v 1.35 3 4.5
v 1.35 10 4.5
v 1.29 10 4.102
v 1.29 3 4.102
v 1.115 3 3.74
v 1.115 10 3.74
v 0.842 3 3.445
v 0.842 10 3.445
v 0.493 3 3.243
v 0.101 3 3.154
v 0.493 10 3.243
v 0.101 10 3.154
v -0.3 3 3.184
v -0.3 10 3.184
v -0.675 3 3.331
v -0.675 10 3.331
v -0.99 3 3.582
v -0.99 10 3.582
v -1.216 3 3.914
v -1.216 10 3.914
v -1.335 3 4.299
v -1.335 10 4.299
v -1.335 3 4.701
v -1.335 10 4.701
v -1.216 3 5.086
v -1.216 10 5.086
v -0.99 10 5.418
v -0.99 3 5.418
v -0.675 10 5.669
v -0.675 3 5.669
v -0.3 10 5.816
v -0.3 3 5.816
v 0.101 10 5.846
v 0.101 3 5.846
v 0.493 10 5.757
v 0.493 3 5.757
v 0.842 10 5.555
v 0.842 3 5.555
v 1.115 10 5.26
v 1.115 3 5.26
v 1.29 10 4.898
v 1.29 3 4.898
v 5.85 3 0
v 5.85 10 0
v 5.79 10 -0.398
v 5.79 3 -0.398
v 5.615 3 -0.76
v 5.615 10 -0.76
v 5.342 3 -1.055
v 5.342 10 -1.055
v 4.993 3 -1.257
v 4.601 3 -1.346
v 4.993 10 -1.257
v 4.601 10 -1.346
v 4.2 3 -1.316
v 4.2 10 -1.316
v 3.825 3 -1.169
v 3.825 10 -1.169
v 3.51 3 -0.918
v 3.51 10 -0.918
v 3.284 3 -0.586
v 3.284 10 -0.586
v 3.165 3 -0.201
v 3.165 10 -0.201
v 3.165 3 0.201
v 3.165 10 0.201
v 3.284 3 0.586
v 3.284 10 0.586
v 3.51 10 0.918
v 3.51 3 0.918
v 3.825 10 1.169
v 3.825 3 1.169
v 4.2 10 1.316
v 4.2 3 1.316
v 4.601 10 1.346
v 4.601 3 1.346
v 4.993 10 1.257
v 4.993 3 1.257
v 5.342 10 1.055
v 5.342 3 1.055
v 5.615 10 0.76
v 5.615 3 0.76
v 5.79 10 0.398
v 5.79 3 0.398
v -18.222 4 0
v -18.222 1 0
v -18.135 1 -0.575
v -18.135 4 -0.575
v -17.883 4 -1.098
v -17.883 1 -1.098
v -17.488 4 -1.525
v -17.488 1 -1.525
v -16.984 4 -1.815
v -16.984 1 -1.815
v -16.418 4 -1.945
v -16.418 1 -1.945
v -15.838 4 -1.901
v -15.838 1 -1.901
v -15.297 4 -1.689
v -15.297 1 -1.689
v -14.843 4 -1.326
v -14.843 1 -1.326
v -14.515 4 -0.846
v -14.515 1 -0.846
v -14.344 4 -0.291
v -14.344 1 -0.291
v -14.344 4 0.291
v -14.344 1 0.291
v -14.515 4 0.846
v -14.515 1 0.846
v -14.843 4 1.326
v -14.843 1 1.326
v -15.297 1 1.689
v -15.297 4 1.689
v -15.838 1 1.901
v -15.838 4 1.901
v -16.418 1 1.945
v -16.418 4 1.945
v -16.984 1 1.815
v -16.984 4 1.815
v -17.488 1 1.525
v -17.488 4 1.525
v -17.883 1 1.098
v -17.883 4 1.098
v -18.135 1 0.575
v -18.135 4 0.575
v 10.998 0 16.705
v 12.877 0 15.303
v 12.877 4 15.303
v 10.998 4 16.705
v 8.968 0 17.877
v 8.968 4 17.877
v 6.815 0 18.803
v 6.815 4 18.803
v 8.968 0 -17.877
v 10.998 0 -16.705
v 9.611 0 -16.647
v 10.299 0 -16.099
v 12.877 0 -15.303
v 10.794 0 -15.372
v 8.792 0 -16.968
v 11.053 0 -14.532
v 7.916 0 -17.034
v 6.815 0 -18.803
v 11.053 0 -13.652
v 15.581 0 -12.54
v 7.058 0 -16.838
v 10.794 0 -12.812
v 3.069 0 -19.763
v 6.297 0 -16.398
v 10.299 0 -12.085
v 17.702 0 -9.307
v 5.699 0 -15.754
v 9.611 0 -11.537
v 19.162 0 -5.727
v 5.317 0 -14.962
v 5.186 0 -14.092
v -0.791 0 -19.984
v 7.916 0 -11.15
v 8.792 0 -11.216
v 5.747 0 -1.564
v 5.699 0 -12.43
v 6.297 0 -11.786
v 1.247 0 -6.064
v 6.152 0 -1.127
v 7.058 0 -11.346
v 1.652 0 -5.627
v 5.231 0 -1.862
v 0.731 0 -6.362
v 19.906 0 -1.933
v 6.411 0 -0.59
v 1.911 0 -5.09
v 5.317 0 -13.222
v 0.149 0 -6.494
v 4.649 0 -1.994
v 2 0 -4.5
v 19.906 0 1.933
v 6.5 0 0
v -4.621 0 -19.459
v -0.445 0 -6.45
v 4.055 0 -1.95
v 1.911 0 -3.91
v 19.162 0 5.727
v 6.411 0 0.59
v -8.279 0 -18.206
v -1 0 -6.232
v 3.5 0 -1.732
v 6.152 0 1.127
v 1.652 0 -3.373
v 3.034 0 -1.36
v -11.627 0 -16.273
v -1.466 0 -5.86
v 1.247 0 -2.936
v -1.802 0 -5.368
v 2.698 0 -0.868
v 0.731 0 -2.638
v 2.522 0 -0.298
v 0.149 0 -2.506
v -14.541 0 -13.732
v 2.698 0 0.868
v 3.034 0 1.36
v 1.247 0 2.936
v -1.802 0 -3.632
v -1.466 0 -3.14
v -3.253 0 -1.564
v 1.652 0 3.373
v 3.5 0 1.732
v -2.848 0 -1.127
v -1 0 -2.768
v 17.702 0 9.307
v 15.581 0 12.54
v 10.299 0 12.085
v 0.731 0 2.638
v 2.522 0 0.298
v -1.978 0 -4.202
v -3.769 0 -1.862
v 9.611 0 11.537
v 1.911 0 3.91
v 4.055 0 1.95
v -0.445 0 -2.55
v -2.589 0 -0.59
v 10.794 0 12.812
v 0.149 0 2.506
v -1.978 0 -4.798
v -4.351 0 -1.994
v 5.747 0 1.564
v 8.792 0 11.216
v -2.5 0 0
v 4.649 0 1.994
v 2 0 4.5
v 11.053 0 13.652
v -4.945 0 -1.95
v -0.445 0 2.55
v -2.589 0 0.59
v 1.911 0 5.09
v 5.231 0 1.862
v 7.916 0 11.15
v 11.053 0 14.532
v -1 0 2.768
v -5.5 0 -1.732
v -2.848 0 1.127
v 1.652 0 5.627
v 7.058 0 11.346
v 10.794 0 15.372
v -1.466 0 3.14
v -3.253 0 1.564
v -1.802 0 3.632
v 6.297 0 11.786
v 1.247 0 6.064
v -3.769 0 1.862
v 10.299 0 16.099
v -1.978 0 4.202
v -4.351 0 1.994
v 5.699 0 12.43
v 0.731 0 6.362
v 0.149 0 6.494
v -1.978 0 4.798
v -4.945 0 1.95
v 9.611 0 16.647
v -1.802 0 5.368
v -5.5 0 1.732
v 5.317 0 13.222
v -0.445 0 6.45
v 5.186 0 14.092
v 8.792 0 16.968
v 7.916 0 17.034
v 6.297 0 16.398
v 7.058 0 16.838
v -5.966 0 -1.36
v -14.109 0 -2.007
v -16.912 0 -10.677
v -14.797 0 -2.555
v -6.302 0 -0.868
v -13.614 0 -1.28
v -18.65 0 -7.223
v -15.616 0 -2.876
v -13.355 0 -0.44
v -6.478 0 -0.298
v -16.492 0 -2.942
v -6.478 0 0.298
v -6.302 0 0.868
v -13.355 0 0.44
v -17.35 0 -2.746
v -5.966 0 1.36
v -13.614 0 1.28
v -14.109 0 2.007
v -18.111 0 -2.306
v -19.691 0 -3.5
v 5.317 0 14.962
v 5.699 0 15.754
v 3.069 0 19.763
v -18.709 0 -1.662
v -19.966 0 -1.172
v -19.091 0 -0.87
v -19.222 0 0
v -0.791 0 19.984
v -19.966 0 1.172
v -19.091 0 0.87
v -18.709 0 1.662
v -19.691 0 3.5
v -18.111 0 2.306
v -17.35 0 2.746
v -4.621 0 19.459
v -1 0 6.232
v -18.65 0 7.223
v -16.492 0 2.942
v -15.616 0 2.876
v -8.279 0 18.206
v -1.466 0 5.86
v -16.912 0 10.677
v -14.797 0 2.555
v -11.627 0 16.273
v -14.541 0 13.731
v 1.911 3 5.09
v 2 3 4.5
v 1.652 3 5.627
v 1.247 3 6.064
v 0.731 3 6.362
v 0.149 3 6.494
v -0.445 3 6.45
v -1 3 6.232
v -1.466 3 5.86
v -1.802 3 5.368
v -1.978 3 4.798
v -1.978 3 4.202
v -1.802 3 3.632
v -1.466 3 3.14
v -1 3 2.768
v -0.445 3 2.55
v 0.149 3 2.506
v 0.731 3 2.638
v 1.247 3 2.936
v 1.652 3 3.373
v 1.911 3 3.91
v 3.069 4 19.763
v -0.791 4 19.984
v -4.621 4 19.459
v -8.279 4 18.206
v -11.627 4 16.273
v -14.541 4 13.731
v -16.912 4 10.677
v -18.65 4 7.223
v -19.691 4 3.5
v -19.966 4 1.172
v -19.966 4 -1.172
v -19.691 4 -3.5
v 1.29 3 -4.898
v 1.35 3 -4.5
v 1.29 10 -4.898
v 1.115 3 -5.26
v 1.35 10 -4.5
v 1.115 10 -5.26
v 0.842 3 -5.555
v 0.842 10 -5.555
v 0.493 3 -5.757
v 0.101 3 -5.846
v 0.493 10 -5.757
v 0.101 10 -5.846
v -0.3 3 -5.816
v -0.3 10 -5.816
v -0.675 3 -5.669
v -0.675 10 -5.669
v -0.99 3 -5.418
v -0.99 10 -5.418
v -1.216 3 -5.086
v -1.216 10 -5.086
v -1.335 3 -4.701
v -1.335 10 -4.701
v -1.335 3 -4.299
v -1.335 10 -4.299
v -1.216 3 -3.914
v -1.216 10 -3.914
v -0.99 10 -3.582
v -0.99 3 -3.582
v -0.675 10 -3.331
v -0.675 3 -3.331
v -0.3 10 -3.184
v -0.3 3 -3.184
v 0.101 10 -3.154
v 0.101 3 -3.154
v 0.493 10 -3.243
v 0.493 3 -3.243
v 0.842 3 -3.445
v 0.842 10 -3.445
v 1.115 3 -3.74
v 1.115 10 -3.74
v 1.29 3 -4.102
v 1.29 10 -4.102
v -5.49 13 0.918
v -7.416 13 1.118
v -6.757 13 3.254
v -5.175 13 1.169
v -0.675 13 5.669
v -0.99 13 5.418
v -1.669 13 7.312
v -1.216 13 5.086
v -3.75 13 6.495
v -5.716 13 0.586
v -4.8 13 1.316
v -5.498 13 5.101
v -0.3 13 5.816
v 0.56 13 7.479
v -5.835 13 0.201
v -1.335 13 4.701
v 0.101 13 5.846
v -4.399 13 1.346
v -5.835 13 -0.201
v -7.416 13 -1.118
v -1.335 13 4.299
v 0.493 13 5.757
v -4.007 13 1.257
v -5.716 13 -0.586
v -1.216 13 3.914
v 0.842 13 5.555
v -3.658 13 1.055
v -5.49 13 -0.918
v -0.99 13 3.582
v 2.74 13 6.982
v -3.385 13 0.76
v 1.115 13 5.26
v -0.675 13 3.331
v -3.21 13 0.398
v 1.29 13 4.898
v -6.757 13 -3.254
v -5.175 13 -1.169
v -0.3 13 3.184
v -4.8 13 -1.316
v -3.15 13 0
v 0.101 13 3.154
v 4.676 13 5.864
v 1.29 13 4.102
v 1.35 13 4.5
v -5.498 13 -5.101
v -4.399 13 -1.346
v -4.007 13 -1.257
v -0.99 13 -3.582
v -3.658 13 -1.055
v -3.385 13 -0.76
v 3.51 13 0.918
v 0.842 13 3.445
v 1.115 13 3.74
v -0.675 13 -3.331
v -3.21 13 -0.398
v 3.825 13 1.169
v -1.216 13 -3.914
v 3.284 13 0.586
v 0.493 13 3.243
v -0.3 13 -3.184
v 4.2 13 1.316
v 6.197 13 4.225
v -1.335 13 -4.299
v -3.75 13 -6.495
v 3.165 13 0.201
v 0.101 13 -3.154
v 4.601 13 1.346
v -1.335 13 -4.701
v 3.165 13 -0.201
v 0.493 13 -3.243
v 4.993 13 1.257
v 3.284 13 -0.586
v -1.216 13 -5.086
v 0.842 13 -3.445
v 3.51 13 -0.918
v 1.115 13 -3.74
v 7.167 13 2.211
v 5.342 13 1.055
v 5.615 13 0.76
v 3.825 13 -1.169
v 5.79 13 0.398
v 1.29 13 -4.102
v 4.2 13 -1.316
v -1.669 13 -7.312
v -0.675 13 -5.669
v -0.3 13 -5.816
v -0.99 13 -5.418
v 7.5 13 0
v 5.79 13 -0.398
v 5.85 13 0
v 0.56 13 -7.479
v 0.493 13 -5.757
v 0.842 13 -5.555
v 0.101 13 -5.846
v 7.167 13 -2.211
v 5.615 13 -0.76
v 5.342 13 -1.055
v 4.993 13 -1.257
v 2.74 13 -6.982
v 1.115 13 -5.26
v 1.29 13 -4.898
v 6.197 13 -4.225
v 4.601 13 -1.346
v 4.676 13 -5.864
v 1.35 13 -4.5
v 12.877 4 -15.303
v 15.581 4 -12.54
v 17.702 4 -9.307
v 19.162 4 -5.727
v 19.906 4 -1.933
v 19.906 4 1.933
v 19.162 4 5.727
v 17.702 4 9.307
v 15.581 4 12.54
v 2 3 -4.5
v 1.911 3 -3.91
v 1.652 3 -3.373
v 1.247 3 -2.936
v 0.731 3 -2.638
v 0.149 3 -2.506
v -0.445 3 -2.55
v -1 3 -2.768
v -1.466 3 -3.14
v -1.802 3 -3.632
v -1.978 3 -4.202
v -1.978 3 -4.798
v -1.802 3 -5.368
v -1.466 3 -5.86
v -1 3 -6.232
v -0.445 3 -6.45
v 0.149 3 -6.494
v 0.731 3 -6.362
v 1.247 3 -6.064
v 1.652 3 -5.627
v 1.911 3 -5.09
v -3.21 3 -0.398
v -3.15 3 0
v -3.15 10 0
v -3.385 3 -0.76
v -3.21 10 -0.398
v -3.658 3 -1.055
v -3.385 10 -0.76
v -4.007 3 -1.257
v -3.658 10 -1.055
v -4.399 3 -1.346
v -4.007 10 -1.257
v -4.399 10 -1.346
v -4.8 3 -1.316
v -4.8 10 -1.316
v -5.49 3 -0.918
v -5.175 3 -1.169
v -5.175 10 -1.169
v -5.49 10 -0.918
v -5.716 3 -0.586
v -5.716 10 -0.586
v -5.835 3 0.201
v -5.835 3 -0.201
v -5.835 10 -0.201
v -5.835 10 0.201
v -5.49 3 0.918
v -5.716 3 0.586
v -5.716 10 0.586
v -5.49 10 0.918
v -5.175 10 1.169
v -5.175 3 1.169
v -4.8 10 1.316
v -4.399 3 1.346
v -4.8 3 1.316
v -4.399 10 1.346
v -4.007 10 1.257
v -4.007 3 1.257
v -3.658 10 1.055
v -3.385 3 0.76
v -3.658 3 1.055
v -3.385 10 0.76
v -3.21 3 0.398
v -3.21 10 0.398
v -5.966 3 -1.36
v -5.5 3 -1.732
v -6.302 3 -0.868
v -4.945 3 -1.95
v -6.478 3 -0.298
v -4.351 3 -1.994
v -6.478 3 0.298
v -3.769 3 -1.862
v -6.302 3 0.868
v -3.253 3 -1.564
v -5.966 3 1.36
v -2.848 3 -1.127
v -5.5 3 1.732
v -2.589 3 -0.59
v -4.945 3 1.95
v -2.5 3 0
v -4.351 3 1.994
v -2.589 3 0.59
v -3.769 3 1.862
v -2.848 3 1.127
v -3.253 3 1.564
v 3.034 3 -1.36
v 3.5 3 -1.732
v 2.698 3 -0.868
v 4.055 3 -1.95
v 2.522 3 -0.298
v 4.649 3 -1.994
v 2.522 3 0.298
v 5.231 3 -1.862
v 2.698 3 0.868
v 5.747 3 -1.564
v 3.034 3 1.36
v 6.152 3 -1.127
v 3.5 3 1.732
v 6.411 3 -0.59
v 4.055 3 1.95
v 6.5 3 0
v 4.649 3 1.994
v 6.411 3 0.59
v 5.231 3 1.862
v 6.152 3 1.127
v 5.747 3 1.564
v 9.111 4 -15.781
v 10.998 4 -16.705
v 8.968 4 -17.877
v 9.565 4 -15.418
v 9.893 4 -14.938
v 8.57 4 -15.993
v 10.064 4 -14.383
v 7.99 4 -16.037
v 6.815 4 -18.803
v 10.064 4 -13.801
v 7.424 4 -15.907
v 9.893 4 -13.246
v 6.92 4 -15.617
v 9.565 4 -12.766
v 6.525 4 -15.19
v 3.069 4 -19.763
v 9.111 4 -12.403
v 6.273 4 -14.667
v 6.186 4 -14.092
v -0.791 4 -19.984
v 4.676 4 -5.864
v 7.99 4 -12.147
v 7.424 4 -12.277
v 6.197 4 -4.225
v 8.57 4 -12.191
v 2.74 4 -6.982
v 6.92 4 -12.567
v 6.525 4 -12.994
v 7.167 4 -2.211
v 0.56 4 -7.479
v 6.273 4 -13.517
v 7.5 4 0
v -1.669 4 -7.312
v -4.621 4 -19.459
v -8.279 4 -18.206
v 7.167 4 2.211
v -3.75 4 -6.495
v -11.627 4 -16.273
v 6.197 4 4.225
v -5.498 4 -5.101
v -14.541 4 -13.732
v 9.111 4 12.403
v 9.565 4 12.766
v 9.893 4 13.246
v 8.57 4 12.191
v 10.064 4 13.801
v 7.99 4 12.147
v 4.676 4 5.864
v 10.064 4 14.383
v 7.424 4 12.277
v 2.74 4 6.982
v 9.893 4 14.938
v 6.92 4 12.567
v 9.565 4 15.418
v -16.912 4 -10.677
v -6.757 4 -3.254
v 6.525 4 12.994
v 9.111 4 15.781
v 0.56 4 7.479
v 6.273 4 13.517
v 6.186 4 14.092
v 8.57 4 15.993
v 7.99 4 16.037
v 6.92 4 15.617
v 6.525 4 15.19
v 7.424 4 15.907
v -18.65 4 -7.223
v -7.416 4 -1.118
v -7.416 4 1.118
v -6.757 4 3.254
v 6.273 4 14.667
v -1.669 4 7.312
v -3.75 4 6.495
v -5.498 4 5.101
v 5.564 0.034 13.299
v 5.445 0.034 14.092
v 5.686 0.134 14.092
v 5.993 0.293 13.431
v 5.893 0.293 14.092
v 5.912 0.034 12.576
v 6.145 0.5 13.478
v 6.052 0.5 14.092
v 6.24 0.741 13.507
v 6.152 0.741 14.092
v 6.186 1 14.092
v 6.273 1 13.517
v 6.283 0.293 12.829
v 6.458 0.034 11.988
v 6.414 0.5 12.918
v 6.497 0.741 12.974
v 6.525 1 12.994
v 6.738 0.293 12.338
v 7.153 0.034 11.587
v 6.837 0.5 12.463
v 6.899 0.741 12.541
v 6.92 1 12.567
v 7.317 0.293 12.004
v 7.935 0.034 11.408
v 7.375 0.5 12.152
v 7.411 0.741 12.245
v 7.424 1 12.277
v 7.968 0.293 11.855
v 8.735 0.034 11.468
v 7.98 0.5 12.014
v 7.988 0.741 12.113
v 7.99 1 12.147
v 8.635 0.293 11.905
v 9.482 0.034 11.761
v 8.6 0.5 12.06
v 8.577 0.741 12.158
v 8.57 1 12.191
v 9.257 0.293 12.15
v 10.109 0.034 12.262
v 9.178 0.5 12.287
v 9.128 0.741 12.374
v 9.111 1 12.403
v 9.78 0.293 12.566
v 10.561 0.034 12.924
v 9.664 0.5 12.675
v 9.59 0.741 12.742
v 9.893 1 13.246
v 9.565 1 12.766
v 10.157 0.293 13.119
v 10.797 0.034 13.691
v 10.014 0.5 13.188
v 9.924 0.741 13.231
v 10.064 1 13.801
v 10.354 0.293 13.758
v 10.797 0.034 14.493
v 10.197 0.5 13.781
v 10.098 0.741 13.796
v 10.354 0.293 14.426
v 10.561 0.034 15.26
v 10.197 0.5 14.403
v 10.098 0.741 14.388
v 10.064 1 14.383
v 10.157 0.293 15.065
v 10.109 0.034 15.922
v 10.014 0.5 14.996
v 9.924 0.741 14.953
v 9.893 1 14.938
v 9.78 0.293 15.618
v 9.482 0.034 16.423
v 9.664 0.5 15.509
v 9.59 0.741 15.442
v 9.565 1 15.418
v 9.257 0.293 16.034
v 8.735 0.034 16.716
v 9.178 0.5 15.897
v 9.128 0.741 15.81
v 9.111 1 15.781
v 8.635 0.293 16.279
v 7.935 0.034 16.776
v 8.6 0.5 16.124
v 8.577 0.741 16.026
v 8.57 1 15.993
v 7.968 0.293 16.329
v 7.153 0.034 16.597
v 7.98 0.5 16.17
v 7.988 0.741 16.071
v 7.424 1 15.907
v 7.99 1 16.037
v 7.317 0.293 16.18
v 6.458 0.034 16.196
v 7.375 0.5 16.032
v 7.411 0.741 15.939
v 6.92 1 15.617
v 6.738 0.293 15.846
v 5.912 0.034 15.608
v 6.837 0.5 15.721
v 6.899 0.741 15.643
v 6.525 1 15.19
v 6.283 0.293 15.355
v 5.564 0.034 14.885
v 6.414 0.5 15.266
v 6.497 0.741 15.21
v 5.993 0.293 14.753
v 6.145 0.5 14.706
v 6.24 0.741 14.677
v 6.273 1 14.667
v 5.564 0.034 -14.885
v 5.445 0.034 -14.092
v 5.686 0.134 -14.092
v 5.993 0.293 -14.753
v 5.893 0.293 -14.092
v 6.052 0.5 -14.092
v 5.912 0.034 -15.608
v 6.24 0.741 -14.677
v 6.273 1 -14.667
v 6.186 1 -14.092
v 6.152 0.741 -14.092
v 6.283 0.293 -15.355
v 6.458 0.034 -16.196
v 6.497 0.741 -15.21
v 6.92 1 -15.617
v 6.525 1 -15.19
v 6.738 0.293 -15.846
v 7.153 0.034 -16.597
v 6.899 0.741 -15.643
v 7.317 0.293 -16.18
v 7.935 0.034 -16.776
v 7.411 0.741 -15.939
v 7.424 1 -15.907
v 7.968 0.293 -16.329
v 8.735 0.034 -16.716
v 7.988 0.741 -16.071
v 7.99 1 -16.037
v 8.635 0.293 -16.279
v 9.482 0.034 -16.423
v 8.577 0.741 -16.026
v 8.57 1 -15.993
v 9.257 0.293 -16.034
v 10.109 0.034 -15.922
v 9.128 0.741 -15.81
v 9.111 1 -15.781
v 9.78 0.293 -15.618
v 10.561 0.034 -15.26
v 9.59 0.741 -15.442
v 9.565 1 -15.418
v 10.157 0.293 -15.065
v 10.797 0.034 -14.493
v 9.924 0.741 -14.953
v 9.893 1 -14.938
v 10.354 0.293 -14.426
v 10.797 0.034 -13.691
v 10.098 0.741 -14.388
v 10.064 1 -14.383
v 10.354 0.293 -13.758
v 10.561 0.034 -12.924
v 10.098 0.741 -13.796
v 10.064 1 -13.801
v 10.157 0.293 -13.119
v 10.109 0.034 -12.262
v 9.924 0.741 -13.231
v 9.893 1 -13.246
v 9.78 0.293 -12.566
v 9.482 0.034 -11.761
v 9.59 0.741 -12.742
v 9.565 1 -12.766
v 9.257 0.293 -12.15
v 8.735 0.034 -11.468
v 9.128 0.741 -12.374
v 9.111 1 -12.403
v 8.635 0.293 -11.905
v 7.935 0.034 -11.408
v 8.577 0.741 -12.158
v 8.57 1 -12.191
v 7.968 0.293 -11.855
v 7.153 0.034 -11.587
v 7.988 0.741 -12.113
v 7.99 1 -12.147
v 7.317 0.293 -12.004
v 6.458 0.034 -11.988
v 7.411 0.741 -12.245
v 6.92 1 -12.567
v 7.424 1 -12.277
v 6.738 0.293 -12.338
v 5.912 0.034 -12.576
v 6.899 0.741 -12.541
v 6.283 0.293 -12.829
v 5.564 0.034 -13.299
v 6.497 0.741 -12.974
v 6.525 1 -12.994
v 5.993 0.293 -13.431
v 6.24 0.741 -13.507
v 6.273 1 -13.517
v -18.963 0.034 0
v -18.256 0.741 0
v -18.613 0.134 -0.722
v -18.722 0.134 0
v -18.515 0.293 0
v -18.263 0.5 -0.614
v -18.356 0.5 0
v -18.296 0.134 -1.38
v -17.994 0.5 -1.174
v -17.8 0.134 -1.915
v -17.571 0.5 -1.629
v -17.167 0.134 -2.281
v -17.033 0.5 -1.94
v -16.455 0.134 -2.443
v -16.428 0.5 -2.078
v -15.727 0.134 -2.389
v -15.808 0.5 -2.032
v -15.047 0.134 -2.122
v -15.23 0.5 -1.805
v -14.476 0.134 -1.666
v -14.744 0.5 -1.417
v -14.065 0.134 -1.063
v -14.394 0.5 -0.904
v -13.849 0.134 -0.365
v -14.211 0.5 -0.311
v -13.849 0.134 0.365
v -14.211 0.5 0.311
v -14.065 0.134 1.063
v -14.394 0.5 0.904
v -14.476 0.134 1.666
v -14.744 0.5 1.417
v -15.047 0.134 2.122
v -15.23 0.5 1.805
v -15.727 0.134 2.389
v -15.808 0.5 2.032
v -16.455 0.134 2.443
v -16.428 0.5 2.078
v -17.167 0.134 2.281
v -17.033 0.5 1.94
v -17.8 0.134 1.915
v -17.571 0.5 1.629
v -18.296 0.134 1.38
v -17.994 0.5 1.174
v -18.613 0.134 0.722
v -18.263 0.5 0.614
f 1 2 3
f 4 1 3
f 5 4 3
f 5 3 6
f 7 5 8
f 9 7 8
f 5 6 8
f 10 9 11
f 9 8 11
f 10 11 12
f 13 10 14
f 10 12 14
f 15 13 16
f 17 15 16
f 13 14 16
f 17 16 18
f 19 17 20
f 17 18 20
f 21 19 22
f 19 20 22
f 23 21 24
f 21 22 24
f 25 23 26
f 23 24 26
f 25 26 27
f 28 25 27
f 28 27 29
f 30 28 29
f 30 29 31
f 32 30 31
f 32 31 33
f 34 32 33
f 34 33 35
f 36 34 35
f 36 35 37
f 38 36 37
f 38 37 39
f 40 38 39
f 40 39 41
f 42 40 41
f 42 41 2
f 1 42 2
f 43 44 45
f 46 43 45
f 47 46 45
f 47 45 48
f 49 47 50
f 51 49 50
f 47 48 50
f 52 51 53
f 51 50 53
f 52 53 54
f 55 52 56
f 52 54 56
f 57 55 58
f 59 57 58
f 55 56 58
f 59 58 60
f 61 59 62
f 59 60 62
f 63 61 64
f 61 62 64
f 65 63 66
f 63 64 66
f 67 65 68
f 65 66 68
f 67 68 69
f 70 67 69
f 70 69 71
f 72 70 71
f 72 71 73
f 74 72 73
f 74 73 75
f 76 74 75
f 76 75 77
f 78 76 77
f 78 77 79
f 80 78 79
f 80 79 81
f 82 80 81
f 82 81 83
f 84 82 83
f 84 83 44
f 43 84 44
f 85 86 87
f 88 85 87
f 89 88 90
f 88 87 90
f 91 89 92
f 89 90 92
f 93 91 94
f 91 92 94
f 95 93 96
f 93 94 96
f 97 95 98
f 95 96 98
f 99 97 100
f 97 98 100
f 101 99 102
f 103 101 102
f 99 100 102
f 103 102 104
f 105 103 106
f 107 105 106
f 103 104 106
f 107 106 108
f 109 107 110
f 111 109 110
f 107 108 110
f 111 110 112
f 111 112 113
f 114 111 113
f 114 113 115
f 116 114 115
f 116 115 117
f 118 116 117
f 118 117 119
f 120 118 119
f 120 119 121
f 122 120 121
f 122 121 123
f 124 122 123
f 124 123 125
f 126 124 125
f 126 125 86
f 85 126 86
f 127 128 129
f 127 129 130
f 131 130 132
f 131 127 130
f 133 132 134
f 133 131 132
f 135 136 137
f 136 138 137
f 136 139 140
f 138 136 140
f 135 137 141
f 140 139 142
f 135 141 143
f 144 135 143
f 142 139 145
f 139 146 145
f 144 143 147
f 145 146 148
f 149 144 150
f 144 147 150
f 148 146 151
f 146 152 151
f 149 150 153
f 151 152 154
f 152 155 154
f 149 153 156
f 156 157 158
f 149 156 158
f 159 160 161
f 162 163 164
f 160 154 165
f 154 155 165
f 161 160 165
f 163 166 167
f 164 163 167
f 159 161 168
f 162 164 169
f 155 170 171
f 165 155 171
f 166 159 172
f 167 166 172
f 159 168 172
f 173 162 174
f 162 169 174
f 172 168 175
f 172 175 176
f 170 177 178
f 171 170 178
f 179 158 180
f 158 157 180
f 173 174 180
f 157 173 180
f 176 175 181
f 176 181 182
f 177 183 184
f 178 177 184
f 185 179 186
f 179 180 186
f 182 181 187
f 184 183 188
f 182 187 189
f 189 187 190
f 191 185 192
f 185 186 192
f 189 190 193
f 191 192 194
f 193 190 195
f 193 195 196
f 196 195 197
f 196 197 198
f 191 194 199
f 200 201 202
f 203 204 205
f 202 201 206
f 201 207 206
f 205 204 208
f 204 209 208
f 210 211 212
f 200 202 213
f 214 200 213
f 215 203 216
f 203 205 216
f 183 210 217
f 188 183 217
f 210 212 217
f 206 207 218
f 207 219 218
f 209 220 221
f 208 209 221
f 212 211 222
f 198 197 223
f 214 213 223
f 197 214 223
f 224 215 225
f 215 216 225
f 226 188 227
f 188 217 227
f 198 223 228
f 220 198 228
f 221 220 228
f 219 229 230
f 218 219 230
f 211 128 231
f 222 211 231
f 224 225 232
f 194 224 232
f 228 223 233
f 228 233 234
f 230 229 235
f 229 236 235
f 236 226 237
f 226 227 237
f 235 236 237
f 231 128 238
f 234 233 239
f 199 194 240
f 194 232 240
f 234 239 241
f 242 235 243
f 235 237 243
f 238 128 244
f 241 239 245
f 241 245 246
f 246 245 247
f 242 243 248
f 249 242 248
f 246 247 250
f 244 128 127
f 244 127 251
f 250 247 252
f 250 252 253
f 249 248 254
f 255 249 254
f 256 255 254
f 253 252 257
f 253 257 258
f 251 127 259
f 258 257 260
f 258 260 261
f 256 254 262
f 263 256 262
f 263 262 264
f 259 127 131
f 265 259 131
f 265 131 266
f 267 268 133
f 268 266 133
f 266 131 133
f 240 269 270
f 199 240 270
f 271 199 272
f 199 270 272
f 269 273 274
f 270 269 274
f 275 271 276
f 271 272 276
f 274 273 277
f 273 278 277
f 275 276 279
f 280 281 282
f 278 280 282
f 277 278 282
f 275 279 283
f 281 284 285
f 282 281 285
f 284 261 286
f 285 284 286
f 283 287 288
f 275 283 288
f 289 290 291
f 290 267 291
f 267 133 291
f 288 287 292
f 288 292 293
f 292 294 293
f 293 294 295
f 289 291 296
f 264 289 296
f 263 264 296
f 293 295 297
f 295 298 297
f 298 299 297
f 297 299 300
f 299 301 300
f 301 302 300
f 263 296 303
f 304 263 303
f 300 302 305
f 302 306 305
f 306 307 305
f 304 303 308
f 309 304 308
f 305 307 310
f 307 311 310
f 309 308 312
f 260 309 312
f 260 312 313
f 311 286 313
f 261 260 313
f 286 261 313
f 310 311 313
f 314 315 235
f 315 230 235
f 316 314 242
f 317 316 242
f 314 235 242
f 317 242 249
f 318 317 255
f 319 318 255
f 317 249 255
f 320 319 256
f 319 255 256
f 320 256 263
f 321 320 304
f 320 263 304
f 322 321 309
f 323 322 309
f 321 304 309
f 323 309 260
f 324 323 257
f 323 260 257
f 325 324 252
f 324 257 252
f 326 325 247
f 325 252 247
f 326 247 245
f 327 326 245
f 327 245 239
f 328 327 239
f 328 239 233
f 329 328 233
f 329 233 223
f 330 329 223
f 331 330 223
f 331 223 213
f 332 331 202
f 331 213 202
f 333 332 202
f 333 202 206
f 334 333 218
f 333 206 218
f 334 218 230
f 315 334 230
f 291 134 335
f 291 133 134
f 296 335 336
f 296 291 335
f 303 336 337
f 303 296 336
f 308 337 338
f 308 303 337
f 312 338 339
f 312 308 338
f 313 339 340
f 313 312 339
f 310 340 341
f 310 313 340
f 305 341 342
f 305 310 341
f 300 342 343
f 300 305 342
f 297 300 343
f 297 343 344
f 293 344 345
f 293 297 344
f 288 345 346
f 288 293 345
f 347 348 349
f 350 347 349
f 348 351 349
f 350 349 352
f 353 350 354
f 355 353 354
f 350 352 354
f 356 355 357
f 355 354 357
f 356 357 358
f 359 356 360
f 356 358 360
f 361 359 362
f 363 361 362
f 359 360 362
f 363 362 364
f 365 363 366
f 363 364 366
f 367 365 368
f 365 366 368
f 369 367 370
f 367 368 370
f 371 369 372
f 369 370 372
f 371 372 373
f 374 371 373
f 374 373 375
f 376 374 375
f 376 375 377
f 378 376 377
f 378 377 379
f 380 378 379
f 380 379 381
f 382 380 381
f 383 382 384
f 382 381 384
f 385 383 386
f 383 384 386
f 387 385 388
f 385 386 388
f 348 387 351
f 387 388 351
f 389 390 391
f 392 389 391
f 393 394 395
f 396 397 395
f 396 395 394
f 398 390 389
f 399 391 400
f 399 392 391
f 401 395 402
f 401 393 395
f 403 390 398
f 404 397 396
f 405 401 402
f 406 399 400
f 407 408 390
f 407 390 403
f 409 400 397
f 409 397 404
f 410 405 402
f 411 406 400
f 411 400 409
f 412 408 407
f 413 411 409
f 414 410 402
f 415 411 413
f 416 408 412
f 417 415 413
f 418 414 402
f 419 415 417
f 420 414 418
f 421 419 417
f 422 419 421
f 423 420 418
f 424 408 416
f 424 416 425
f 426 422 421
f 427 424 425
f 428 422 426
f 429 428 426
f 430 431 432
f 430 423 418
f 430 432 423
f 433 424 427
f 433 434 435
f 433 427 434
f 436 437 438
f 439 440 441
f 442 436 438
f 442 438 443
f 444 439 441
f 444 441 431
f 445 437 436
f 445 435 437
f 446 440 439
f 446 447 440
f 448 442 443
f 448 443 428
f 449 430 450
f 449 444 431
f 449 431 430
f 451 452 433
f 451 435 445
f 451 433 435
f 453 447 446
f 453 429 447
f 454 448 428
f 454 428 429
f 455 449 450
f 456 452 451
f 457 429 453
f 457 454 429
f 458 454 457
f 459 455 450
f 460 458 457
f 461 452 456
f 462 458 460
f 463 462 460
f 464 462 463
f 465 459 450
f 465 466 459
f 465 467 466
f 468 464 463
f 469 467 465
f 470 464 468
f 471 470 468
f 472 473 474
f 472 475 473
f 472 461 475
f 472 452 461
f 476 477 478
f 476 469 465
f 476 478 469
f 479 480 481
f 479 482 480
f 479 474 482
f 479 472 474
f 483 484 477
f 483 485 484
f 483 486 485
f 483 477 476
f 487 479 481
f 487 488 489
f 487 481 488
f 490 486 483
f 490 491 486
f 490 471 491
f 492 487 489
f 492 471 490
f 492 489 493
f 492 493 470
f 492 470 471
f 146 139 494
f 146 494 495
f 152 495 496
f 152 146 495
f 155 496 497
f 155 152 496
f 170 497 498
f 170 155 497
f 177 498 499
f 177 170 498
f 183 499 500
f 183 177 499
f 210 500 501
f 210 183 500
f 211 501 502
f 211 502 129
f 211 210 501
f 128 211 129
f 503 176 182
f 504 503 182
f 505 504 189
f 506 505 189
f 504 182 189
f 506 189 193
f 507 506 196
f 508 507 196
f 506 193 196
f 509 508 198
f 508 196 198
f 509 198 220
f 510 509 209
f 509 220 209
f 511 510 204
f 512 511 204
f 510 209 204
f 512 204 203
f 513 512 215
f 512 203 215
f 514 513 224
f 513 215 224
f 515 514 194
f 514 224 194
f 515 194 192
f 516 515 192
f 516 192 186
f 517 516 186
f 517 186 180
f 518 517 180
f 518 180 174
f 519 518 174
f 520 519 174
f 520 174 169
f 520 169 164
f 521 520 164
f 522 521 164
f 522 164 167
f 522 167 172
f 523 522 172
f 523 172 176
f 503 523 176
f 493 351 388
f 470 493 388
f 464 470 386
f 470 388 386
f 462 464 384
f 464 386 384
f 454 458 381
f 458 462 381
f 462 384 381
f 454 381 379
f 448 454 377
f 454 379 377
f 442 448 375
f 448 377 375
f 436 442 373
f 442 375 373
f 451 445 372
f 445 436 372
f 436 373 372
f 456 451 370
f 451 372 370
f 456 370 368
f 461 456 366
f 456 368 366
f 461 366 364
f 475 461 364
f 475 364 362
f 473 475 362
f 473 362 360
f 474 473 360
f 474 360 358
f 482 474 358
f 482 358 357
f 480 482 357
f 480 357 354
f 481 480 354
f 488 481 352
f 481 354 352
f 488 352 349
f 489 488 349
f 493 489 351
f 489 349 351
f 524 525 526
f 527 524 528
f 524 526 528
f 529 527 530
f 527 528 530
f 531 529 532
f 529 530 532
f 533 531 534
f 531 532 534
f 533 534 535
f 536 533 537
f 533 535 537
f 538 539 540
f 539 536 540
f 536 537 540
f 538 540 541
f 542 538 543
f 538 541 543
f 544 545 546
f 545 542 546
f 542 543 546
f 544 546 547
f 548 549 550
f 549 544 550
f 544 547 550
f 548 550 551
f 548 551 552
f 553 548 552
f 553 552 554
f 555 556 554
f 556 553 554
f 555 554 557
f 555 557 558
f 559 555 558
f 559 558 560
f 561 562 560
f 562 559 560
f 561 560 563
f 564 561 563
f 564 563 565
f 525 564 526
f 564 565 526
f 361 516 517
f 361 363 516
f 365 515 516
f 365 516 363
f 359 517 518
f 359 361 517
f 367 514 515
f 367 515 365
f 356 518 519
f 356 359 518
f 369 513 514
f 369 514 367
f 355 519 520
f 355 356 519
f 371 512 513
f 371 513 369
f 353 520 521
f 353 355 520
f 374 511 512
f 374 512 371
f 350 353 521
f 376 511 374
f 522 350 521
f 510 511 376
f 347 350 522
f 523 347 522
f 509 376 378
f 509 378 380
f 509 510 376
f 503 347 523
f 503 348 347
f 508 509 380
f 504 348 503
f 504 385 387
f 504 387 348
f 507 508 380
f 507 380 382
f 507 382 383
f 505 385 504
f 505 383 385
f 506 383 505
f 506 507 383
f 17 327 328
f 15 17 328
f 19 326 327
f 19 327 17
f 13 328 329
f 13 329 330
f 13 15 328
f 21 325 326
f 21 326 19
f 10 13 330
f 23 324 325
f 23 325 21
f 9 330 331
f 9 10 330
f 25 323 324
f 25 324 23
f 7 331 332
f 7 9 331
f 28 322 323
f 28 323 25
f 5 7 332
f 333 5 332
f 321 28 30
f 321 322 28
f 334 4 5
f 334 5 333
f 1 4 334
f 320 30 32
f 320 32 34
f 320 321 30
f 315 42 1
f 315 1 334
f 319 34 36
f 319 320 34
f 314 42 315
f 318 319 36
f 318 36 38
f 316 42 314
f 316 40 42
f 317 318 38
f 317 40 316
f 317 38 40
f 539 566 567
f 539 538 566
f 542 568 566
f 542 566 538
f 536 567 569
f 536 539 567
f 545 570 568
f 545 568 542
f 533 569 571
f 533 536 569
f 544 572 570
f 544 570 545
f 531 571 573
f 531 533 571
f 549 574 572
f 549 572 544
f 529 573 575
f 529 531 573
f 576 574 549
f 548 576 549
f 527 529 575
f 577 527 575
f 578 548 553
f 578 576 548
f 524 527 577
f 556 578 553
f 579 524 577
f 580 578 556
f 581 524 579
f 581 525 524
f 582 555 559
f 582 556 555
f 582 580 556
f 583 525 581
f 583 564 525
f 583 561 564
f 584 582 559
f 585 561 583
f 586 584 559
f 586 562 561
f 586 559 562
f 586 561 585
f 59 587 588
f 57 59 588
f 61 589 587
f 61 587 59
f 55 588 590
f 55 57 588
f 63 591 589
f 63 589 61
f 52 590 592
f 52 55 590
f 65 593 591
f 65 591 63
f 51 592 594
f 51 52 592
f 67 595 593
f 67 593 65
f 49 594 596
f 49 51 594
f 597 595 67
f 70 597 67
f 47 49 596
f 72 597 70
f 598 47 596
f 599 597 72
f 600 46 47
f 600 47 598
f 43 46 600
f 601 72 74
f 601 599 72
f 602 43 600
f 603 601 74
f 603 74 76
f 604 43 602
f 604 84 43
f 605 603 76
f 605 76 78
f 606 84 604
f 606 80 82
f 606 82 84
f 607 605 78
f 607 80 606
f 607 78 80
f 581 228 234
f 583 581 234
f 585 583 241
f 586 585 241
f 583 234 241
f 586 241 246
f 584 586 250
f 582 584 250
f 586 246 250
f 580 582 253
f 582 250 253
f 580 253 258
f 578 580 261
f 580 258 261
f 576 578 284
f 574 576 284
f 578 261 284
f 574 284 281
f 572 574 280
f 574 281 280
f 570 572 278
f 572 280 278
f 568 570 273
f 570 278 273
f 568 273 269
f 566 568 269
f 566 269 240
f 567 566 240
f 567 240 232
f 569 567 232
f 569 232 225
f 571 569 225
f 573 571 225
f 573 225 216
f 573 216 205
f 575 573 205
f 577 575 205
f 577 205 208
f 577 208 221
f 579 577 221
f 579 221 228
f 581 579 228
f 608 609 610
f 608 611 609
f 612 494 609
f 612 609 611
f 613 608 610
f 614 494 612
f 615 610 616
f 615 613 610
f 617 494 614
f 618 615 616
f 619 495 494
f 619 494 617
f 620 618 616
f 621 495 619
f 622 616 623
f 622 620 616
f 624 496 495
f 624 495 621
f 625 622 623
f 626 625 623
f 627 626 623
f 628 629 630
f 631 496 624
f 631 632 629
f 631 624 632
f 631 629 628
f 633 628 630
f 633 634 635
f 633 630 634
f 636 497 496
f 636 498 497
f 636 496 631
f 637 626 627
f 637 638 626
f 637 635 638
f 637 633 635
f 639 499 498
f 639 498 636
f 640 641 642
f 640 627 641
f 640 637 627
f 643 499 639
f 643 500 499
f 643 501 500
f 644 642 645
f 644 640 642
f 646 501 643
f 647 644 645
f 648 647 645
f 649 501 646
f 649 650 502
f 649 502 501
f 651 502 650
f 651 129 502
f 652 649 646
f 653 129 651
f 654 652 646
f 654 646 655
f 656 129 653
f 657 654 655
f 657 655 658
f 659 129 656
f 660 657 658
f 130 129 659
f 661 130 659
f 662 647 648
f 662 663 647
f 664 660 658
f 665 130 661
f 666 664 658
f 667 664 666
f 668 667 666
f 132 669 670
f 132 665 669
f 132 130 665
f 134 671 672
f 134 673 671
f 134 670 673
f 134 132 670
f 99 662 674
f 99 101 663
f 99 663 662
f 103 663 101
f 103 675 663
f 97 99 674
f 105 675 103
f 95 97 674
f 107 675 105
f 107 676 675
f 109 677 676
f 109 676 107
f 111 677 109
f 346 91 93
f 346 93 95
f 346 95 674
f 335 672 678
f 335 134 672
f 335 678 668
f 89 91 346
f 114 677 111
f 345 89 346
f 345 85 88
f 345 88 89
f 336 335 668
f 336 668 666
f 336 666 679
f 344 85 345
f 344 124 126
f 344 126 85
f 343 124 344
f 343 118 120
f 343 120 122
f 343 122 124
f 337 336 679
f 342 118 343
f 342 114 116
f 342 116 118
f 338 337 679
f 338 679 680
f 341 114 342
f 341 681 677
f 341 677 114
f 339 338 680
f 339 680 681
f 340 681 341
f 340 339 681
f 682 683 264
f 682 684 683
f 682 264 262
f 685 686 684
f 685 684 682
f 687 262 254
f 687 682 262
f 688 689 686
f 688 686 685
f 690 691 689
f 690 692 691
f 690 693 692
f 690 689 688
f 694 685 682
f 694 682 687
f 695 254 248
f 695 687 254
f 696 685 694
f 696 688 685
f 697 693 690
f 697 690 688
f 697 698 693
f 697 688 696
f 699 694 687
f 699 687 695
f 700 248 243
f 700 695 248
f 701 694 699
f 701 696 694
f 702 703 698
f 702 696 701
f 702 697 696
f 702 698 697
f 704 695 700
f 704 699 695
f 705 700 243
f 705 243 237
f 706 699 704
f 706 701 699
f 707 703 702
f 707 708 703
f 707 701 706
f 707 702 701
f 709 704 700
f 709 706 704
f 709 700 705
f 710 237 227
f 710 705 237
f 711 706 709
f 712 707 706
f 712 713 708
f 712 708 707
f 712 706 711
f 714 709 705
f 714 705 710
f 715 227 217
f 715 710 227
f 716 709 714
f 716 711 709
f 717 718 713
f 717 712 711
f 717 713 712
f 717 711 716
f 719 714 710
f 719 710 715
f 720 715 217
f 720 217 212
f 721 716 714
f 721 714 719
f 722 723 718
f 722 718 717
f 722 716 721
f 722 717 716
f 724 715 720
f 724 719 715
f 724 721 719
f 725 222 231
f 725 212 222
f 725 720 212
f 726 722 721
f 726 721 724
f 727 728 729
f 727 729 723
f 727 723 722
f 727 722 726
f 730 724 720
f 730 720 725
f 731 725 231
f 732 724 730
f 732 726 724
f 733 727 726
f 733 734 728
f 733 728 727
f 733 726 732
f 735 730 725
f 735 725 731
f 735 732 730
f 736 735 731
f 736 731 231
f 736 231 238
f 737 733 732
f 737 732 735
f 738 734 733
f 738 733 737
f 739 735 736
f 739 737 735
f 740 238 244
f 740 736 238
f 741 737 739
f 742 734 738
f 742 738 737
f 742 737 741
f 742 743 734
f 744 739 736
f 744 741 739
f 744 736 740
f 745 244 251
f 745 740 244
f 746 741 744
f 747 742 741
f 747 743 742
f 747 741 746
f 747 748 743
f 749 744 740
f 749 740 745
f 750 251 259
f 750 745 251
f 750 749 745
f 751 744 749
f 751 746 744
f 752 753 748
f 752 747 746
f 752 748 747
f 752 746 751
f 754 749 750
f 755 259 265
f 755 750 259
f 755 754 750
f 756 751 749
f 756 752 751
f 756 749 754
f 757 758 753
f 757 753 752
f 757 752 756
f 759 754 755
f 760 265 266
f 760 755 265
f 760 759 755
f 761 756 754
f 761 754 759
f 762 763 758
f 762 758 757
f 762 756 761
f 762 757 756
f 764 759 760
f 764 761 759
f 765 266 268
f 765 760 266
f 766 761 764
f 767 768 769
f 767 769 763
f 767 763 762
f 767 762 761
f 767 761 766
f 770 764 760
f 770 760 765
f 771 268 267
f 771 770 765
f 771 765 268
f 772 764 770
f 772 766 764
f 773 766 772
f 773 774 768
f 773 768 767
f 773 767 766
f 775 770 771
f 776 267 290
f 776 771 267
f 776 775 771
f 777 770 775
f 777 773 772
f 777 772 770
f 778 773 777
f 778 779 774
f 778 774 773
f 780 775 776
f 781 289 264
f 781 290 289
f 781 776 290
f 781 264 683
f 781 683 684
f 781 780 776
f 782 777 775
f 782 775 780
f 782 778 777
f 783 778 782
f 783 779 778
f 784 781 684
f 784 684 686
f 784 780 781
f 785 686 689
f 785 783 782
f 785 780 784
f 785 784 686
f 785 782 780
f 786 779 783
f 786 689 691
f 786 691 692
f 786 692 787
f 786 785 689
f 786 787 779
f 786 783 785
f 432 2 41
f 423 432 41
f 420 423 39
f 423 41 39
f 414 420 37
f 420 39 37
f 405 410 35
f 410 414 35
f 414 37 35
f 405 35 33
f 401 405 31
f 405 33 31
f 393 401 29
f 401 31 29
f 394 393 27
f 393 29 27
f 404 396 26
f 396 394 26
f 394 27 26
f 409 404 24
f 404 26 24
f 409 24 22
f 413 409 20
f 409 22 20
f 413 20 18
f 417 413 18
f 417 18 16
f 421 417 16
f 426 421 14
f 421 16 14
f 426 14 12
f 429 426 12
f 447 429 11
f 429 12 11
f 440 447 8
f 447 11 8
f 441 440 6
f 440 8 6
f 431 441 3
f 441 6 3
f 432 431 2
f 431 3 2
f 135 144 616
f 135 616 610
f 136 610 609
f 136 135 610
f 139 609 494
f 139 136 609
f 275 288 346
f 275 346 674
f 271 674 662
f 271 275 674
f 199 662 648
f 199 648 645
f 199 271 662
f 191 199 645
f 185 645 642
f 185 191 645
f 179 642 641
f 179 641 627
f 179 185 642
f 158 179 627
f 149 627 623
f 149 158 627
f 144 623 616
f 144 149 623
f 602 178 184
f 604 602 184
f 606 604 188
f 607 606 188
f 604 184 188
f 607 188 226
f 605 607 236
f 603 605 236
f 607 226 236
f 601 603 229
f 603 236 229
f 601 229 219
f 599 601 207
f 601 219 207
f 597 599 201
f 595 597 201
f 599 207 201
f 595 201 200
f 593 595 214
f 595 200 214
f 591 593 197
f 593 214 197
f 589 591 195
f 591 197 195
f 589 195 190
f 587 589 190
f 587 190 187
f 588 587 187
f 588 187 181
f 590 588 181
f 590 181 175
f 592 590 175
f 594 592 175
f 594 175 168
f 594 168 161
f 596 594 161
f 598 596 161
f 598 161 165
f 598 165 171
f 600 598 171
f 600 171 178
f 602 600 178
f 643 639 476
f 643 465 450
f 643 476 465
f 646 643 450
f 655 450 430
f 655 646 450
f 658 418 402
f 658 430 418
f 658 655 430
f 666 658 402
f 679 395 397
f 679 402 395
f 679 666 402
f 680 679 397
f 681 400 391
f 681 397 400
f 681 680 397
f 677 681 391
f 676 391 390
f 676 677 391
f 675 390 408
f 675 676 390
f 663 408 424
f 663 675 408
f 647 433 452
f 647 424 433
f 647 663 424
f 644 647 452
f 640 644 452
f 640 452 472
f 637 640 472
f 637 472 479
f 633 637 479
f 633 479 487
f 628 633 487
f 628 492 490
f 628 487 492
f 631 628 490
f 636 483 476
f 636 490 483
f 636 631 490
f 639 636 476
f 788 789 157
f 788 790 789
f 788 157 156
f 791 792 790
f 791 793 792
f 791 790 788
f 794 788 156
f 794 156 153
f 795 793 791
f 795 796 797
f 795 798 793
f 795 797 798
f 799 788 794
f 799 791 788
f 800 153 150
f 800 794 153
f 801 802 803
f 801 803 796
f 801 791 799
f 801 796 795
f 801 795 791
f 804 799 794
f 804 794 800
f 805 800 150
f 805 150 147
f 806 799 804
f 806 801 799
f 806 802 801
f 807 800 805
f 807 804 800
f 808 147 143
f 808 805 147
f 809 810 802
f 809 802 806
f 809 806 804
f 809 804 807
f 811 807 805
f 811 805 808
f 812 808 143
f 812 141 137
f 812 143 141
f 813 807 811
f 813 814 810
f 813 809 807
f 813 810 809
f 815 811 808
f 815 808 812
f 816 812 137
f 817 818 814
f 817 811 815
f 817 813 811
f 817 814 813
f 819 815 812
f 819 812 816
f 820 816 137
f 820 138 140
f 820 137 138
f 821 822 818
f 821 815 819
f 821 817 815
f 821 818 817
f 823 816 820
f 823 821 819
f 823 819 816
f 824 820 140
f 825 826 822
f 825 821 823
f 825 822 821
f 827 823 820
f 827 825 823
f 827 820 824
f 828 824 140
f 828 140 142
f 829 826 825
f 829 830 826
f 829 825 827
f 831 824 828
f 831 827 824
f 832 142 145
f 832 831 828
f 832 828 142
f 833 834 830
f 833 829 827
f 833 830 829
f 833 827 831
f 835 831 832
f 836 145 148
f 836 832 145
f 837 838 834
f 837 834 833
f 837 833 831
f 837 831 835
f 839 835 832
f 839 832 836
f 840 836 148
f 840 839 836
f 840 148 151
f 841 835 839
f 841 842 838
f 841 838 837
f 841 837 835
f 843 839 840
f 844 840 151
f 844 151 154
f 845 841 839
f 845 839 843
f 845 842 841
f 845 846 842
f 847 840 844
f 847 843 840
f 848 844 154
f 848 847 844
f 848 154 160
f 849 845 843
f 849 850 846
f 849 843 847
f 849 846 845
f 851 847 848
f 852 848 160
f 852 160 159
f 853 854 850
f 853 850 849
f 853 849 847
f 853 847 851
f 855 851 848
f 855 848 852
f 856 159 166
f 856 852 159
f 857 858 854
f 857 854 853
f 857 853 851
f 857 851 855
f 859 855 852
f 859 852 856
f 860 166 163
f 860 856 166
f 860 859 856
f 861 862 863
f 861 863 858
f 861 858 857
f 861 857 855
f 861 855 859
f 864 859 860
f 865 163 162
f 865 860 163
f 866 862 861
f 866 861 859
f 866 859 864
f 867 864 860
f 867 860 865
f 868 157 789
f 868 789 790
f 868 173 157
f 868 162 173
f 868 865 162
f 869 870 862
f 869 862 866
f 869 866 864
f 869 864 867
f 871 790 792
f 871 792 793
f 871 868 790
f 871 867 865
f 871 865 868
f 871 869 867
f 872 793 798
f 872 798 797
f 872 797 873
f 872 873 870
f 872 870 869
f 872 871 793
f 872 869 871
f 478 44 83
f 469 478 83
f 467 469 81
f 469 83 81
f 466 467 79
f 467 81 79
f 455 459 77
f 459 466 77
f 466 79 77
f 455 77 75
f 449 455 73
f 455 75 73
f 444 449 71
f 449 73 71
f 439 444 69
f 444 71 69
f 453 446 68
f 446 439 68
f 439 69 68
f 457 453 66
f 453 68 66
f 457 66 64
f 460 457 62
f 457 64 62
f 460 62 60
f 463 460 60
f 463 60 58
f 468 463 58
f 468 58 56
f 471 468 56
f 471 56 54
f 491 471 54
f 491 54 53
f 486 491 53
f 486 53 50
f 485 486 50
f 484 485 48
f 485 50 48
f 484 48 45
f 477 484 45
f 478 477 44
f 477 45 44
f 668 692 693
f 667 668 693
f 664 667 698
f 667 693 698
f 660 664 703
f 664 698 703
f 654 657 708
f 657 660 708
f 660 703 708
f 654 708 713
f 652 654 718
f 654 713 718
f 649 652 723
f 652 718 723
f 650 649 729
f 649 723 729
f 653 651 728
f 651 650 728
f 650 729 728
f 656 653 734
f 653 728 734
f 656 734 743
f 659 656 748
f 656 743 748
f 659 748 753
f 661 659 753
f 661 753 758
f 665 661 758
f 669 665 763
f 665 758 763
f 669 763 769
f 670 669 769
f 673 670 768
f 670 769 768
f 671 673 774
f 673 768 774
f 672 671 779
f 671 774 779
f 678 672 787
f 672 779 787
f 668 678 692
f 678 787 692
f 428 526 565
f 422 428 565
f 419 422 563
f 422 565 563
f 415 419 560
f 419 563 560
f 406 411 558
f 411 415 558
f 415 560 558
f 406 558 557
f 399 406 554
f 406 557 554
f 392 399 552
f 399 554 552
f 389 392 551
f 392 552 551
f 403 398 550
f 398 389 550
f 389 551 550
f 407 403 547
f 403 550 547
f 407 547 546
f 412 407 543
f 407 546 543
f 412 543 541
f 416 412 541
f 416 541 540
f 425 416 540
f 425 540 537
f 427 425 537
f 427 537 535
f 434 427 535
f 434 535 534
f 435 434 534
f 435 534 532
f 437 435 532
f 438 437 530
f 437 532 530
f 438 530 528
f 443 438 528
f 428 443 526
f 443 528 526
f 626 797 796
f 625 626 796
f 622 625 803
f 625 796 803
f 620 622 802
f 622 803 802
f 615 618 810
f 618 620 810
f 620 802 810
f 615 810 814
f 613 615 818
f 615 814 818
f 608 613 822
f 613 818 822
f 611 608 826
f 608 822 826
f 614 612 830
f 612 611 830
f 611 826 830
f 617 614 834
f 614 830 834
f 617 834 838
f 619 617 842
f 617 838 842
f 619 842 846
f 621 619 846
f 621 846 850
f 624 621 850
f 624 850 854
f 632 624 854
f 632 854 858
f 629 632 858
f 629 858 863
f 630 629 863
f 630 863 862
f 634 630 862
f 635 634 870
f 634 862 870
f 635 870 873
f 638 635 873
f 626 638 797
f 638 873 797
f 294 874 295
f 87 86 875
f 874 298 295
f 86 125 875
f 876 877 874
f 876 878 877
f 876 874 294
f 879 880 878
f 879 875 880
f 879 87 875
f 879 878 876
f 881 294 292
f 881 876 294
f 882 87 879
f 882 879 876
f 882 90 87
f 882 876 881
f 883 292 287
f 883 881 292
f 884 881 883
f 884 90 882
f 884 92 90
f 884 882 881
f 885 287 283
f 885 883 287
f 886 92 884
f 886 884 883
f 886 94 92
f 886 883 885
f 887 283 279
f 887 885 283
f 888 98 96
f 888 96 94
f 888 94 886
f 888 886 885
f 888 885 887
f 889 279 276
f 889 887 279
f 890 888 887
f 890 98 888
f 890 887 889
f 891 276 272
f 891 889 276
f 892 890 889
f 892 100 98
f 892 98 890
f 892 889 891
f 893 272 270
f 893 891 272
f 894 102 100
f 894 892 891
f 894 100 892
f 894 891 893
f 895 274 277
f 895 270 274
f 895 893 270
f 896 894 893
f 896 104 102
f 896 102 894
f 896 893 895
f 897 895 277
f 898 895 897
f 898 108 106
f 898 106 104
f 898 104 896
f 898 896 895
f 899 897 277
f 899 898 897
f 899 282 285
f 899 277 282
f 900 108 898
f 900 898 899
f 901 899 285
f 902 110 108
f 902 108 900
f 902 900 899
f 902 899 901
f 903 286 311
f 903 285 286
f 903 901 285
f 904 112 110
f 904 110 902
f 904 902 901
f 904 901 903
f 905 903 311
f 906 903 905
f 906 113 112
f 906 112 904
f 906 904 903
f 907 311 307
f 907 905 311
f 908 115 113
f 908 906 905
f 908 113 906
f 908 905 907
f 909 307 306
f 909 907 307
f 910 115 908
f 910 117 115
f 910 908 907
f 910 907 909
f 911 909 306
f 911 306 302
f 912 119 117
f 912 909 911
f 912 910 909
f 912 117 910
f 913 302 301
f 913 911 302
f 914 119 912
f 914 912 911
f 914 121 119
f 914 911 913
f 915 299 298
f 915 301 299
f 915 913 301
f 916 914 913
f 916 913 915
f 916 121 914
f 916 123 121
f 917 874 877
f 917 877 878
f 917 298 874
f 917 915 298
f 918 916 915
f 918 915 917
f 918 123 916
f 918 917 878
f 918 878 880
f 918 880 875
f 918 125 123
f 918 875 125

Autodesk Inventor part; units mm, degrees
ref_plane "YZ Plane" through (0, 0, 0) normal (1, 0, 0) x (0, 1, 0)
ref_plane "XZ Plane" through (0, 0, 0) normal (0, 1, 0) x (-1, 0, 0)
ref_plane "XY Plane" through (0, 0, 0) normal (0, 0, 1) x (1, 0, 0)
sketch "Sketch1" plane through (0, 0, 0) normal (0, 1, 0) x (-1, 0, 0)
  circle A0 centre (16.272, 0) radius 1.95
  line L0 (14.741, 3.5) -> (19.6914, 3.5)
  line L1 (14.741, -3.5) -> (19.6914, -3.5)
  line L2 (14.741, 3.5) -> (12, 3.5)
  line L3 (14.741, -3.5) -> (12, -3.5)
  line L4 (-2.9689, 12.1423) -> (-6.8146, 18.8032)
  line L5 (-12.8768, 15.3032) -> (-9.0311, 8.6423)
  line L6 (12, -3.5) -> (19.6914, -3.5)
  line L7 (12, 3.5) -> (19.6914, 3.5)
  line L8 (-2.9689, -12.1423) -> (-6.8146, -18.8032)
  line L9 (-9.0311, -8.6423) -> (-12.8768, -15.3032)
  arc A1 (-6.8146, 18.8032) -> (-12.8768, 15.3032) centre (0, 0) ccw
  arc A2 (-12.8768, -15.3032) -> (-6.8146, -18.8032) centre (0, 0) ccw
  arc A3 (19.6914, -3.5) -> (19.6914, 3.5) centre (0, 0) ccw
  arc A4 (-9.0311, 8.6423) -> (-9.0311, -8.6423) centre (0, 0) ccw
  arc A5 (-2.9689, -12.1423) -> (12, -3.5) centre (0, 0) ccw
  arc A6 (12, 3.5) -> (-2.9689, 12.1423) centre (0, 0) ccw
  line L10 (0, 0) -> (16.272, 0)
  circle A7 centre (-8.136, 14.092) radius 1.95
  circle A8 centre (-8.136, -14.092) radius 1.95
  dimension "d6" = 3.9
  dimension "d20" = 16.272
  dimension "d23" = 360
extrude "Extrusion1" add sketch "Sketch1" along normal blind 4
sketch "Sketch2" plane through (0, 4, 0) normal (0, 1, 0) x (1, 0, 0)
  circle A0 centre (0, 0) radius 7.5
extrude "Extrusion2" add sketch "Sketch2" along normal blind 6
sketch "Sketch3" plane through (0, 10, 0) normal (0, 1, 0) x (1, 0, 0)
  circle A0 centre (-4.5, 0) radius 1.35
  circle A1 centre (0, -4.5) radius 1.35
  circle A2 centre (4.5, 0) radius 1.35
  circle A3 centre (0, 4.5) radius 1.35
  point P0 (0, 0)
  point P1 (0, 0)
  dimension "d26" = 2.7
  dimension "d30" = 360
extrude "Extrusion3" cut sketch "Sketch3" against normal through all
sketch "Sketch4" plane through (0, 0, 0) normal (0, -1, 0) x (1, 0, 0)
  circle A0 centre (-4.5, 0) radius 1.35 projected
  circle A1 centre (-4.5, 0) radius 2
  circle A2 centre (0, -4.5) radius 2
  circle A3 centre (4.5, 0) radius 2
  circle A4 centre (0, 4.5) radius 2
  point P0 (0, 0)
  point P1 (0, 0)
  dimension "d34" = 4
  dimension "d37" = 360
extrude "Extrusion4" cut sketch "Sketch4" against normal blind 3
sketch "Sketch5" plane through (0, 0, 0) normal (0, -1, 0) x (1, 0, 0)
  arc A0 (12.8768, 15.3032) -> (6.8146, 18.8032) centre (0, 0) ccw projected
  arc A1 (-19.6914, 3.5) -> (-19.6914, -3.5) centre (0, 0) ccw projected
  line L0 (-19.6914, 3.5) -> (-12, 3.5) projected
  line L1 (-19.6914, 3.5) -> (-12, 3.5)
  line L2 (-12, -3.5) -> (-19.6914, -3.5) projected
  line L3 (-19.6914, -3.5) -> (-12, -3.5)
  line L4 (6.8146, -18.8032) -> (2.9689, -12.1423) projected
  line L5 (6.8146, -18.8032) -> (2.9689, -12.1423)
  line L6 (9.0311, -8.6423) -> (12.8768, -15.3032) projected
  line L7 (12.8768, -15.3032) -> (9.0311, -8.6423)
  line L8 (12.8768, 15.3032) -> (9.0311, 8.6423) projected
  arc A2 (9.0311, -8.6423) -> (9.0311, 8.6423) centre (0, 0) ccw projected
  line L9 (12.8768, 15.3032) -> (9.0311, 8.6423)
  line L10 (2.9689, 12.1423) -> (6.8146, 18.8032) projected
  line L11 (6.8146, 18.8032) -> (2.9689, 12.1423)
  arc A3 (2.9689, 12.1423) -> (-12, 3.5) centre (0, 0) ccw projected
  arc A4 (2.9689, 12.1423) -> (-12, 3.5) centre (0, 0) ccw
  arc A5 (6.8146, 18.8032) -> (-19.6914, 3.5) centre (0, 0) ccw
  arc A6 (-19.6914, -3.5) -> (6.8146, -18.8032) centre (0, 0) ccw
  arc A7 (12.8768, -15.3032) -> (12.8768, 15.3032) centre (0, 0) ccw
  arc A8 (-12, -3.5) -> (2.9689, -12.1423) centre (0, 0) ccw
  arc A9 (9.0311, -8.6423) -> (9.0311, 8.6423) centre (0, 0) ccw
extrude "Extrusion5" add sketch "Sketch5" against normal up to surface (4 mm away)
fillet "Fillet1" radius 1 3 edges at (10.086, 0, 14.092) (-14.322, 0, 0) (10.086, 0, -14.092)
sketch "Sketch6" plane through (0, 10, 0) normal (0, 1, 0) x (1, 0, 0)
  circle A0 centre (0, 0) radius 7.5
  circle A1 centre (-4.5, 0) radius 1.35 projected
  circle A2 centre (-4.5, 0) radius 1.35
  circle A3 centre (0, 4.5) radius 1.35 projected
  circle A4 centre (0, 4.5) radius 1.35
  circle A5 centre (4.5, 0) radius 1.35 projected
  circle A6 centre (4.5, 0) radius 1.35
  circle A7 centre (0, -4.5) radius 1.35 projected
  circle A8 centre (0, -4.5) radius 1.35
extrude "Extrusion6" add sketch "Sketch6" along normal blind 3
properties part number "Planet_Gear_Output"
